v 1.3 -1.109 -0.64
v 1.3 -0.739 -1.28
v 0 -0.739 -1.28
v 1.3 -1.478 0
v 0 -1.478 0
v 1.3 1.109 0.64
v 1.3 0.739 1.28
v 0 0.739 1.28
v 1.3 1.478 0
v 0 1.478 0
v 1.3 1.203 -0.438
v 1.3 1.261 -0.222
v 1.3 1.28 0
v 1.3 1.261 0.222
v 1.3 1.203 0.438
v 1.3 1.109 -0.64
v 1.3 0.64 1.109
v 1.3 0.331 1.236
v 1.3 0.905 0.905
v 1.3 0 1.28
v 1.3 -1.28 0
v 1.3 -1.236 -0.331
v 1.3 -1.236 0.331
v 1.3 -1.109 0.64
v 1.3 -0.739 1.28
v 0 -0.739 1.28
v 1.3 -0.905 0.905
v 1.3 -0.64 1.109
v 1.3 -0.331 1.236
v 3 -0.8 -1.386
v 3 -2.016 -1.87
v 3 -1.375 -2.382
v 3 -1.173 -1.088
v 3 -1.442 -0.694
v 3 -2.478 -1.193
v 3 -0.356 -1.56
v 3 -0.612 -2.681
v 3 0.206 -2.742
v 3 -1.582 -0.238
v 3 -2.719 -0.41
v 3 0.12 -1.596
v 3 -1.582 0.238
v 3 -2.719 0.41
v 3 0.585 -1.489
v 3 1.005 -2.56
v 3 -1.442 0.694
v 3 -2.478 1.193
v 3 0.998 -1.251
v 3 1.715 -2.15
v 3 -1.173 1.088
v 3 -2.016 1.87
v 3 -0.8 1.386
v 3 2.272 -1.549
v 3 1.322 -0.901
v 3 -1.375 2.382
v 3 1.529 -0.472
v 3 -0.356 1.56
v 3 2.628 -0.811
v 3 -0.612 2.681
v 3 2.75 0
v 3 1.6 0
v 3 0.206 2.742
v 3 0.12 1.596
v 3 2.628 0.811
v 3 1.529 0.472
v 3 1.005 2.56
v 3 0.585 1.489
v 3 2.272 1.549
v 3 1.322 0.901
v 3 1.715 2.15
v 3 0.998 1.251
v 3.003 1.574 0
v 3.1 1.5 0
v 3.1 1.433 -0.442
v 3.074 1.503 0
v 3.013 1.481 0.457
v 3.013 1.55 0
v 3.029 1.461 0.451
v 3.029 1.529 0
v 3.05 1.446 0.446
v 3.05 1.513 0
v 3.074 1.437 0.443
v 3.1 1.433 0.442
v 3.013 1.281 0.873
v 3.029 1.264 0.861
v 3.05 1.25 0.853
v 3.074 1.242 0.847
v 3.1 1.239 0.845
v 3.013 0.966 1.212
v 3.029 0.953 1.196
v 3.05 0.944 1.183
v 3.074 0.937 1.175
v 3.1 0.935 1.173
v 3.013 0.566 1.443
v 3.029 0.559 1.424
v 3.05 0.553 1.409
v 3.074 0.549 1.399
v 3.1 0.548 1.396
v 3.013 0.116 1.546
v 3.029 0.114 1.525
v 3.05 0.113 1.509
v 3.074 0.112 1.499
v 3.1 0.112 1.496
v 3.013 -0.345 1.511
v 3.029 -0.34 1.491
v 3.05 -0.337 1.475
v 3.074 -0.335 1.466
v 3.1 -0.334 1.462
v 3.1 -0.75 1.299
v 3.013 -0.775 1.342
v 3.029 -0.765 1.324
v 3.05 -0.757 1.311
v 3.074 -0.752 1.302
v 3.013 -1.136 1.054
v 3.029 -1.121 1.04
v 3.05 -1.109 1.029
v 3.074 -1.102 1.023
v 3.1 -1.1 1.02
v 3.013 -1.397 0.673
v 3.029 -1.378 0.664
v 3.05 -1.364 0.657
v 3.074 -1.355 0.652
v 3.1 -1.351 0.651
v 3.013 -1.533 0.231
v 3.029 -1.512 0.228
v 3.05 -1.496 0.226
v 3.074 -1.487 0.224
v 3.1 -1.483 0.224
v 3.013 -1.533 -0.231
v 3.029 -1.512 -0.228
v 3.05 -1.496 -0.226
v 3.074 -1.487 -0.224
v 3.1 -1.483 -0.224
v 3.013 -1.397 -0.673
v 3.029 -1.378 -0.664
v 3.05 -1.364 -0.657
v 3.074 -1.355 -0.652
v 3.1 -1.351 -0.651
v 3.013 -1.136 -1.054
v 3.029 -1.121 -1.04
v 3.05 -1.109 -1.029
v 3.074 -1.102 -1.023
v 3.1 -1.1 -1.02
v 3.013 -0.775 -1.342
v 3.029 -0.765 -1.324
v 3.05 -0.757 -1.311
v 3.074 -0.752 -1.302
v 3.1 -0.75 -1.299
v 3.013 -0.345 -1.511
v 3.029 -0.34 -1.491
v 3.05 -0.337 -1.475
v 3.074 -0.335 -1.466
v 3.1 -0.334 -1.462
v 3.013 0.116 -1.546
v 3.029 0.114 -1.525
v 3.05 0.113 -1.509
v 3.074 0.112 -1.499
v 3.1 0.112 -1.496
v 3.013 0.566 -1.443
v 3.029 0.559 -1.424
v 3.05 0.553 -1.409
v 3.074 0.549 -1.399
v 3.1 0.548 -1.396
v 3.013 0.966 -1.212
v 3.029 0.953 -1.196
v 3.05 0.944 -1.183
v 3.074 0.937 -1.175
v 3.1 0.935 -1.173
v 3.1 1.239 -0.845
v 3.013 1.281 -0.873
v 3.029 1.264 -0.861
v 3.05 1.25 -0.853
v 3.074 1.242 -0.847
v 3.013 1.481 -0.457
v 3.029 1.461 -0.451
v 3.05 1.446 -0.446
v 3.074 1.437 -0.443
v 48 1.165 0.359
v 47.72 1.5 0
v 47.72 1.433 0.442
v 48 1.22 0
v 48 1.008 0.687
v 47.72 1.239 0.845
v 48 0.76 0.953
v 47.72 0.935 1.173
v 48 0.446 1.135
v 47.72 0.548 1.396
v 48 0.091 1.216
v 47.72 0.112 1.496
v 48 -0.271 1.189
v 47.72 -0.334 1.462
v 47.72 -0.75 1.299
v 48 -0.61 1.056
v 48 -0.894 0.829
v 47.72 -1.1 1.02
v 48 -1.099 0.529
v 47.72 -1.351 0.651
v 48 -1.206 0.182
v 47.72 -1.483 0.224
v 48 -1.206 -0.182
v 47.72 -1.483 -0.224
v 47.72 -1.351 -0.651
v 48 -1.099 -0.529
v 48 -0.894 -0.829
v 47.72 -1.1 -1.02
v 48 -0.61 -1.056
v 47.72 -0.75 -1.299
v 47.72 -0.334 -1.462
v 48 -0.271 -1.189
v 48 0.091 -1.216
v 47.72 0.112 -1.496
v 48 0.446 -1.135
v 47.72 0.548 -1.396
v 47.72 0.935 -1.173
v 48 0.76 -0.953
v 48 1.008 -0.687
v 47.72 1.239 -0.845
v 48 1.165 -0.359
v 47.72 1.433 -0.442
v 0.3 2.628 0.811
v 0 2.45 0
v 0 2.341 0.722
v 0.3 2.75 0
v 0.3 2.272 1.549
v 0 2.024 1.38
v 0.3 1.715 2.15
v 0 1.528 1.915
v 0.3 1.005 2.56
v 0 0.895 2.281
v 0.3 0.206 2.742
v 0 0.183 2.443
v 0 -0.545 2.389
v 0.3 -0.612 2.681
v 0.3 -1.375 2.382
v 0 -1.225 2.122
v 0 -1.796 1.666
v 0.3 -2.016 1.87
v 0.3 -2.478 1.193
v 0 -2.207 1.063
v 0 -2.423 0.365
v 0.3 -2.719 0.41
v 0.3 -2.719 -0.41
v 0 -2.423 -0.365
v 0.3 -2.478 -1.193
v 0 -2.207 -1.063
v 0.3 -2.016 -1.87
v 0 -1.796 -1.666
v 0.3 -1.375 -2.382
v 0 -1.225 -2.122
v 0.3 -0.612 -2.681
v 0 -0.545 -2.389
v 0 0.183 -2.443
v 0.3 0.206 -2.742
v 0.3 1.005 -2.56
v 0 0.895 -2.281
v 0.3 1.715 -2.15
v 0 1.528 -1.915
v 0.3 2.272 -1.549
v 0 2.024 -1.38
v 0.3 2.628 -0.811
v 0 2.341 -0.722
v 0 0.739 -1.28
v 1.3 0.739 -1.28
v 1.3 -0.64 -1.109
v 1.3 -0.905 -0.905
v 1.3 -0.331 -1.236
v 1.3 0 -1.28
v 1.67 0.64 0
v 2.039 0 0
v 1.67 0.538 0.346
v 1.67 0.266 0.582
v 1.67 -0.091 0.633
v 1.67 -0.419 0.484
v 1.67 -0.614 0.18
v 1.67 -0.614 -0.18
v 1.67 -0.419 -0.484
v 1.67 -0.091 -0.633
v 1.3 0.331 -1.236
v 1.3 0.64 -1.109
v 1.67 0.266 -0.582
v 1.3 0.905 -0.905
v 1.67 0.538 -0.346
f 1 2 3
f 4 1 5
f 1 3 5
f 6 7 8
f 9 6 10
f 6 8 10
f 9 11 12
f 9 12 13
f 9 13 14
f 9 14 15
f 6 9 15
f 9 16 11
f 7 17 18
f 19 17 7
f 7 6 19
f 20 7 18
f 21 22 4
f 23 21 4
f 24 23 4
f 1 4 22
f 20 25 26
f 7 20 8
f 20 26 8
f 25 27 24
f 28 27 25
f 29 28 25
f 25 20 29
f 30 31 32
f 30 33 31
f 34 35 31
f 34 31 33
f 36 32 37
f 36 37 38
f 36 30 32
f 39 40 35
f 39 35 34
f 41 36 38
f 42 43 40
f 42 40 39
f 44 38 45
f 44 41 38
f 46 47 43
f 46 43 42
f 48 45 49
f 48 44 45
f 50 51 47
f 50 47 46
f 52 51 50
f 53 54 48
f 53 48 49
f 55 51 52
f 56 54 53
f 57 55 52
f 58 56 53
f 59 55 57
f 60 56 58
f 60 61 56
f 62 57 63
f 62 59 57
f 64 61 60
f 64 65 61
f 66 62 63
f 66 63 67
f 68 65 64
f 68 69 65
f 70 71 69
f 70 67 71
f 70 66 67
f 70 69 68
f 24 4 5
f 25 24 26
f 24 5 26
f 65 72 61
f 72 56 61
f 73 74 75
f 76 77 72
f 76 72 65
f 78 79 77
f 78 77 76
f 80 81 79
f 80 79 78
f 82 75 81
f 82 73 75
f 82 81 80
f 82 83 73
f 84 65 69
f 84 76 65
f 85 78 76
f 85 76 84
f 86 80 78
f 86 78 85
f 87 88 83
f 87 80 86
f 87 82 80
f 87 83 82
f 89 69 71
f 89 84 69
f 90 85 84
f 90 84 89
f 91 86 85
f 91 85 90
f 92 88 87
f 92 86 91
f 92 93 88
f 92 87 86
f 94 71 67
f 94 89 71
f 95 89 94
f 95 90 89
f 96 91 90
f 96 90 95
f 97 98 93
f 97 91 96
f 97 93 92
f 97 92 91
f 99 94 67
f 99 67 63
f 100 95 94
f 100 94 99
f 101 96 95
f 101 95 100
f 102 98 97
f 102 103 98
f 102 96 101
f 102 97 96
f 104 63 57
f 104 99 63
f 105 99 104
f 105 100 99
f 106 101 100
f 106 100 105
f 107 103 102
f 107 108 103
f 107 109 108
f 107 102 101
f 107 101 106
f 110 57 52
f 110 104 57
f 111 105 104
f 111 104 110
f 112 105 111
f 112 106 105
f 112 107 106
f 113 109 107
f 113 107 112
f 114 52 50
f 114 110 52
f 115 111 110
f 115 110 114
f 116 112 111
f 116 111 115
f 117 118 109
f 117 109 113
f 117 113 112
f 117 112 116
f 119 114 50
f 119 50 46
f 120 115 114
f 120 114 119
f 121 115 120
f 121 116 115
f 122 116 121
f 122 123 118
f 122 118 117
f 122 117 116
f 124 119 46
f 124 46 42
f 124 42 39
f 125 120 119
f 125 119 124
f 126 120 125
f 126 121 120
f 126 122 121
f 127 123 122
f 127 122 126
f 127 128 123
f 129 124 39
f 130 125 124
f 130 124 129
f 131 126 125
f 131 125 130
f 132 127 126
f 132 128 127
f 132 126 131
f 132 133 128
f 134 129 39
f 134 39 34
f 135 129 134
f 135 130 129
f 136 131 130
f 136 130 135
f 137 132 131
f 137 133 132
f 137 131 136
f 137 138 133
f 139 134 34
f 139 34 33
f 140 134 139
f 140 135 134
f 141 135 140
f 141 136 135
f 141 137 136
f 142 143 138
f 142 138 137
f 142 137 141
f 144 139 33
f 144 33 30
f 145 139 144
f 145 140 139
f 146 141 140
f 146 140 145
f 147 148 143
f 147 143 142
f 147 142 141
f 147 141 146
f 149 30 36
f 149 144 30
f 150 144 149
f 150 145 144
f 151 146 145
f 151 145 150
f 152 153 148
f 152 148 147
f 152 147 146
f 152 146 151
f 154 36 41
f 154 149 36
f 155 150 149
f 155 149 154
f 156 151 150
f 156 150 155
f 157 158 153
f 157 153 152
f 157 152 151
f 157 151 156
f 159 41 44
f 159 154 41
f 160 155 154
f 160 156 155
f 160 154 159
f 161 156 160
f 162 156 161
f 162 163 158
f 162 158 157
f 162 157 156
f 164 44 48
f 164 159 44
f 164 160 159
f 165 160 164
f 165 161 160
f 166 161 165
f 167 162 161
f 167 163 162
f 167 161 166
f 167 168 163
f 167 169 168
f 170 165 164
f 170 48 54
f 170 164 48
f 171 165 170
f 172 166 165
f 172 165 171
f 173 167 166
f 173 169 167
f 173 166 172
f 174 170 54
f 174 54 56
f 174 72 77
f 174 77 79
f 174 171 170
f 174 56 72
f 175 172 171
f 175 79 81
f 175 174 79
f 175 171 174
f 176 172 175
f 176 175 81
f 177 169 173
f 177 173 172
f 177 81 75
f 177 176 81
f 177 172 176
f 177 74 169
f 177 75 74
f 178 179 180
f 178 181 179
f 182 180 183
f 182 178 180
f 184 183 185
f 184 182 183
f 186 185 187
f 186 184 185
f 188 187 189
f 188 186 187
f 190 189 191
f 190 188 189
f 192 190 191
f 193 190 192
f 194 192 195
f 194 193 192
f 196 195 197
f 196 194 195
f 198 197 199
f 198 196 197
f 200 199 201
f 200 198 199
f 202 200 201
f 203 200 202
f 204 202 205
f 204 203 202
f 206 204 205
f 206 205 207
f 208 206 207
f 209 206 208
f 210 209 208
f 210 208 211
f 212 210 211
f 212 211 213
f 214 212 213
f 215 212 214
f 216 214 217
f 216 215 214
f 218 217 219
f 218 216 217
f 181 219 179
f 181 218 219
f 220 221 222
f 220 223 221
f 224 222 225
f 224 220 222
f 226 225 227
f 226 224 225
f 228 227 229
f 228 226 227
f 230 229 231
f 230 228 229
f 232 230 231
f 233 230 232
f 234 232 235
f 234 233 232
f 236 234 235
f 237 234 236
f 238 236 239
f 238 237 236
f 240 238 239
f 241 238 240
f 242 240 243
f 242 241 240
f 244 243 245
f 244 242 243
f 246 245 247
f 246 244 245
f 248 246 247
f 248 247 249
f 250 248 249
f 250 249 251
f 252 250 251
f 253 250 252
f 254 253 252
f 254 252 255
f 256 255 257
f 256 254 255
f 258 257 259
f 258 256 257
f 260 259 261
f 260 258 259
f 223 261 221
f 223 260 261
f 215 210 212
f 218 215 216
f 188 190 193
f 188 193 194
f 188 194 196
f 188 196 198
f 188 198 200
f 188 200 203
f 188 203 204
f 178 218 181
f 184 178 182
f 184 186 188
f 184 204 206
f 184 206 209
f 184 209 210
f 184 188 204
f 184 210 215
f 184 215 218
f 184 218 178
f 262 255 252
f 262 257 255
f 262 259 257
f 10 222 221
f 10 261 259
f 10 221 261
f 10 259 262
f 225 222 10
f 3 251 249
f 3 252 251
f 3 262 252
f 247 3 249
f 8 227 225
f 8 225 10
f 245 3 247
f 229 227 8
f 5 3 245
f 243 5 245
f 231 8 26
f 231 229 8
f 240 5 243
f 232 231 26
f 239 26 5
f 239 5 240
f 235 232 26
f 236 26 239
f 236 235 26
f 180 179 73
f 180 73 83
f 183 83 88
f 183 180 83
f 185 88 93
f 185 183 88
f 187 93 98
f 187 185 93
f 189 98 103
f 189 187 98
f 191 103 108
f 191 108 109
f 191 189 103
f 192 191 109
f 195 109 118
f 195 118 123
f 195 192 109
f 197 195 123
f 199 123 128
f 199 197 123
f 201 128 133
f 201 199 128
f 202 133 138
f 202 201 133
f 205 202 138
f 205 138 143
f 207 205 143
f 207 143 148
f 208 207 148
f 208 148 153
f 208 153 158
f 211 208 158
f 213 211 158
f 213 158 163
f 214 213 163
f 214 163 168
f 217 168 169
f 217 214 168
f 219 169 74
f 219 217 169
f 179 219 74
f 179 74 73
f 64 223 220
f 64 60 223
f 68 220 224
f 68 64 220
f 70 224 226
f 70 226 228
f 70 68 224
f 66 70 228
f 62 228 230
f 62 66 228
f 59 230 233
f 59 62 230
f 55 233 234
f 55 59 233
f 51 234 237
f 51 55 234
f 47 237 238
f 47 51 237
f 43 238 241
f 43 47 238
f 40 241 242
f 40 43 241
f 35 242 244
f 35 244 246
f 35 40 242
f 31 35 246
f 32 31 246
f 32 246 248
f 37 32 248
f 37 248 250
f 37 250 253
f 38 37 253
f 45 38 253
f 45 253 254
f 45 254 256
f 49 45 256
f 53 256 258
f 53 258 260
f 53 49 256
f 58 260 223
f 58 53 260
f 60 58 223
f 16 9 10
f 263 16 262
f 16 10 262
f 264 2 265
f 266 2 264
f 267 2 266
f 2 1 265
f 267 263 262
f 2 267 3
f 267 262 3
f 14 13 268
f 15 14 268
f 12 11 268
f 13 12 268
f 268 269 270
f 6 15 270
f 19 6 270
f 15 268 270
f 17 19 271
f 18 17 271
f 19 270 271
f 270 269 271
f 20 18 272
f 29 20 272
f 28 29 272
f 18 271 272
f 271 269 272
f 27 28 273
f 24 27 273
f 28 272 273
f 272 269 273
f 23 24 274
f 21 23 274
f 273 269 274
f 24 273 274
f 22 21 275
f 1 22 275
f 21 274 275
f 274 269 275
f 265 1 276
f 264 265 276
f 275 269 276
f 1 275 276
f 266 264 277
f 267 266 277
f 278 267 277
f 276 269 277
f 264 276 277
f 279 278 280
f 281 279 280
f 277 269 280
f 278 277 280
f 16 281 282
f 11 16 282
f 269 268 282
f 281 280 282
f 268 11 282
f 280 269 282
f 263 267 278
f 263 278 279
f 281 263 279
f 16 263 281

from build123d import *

# Parameters (mm, degrees)
FILLET1_R   = 0.1
HEX_2_DEPTH = 1.3


with BuildPart() as part:
    # BodySke → Base-Revolve (revolve)
    with BuildSketch(Plane.XY):
        Polygon((0, 0), (0, 2.45), (0.3, 2.75), (3, 2.75), (3, 1.5), (47.7195, 1.5), (48, 1.2195), (48, 0), align=None)
    revolve(axis=Axis((-31.75, 0, 0), (1, 0, 0)))

    # Fillet1
    fillet1_edges = [part.edges().sort_by_distance(p)[0] for p in [
        (3, -1.5, 0),
    ]]
    fillet(fillet1_edges, radius=FILLET1_R)

    # Sketch2 → Hex-PreBroach (revolve, cut)
    with BuildSketch(Plane.XY):
        Polygon((0, 1.28), (1.3, 1.28), (2.039008345, 0), (0, 0), align=None)
    revolve(axis=Axis((0, 0, 0), (1, 0, 0)), mode=Mode.SUBTRACT)

    # Sketch3 → Hex 2 (cut)
    with BuildSketch(Plane(origin=(0, 0, 0), x_dir=(0, 0.5, 0.866025404), z_dir=(-1, 0, 0))):
        Polygon((0.739008345, 1.28), (-0.739008345, 1.28), (-1.478016689, 0), (-0.739008345, -1.28), (0.739008345, -1.28), (1.478016689, 0), align=None)
    extrude(amount=-HEX_2_DEPTH, mode=Mode.SUBTRACT)


solid = part.part
